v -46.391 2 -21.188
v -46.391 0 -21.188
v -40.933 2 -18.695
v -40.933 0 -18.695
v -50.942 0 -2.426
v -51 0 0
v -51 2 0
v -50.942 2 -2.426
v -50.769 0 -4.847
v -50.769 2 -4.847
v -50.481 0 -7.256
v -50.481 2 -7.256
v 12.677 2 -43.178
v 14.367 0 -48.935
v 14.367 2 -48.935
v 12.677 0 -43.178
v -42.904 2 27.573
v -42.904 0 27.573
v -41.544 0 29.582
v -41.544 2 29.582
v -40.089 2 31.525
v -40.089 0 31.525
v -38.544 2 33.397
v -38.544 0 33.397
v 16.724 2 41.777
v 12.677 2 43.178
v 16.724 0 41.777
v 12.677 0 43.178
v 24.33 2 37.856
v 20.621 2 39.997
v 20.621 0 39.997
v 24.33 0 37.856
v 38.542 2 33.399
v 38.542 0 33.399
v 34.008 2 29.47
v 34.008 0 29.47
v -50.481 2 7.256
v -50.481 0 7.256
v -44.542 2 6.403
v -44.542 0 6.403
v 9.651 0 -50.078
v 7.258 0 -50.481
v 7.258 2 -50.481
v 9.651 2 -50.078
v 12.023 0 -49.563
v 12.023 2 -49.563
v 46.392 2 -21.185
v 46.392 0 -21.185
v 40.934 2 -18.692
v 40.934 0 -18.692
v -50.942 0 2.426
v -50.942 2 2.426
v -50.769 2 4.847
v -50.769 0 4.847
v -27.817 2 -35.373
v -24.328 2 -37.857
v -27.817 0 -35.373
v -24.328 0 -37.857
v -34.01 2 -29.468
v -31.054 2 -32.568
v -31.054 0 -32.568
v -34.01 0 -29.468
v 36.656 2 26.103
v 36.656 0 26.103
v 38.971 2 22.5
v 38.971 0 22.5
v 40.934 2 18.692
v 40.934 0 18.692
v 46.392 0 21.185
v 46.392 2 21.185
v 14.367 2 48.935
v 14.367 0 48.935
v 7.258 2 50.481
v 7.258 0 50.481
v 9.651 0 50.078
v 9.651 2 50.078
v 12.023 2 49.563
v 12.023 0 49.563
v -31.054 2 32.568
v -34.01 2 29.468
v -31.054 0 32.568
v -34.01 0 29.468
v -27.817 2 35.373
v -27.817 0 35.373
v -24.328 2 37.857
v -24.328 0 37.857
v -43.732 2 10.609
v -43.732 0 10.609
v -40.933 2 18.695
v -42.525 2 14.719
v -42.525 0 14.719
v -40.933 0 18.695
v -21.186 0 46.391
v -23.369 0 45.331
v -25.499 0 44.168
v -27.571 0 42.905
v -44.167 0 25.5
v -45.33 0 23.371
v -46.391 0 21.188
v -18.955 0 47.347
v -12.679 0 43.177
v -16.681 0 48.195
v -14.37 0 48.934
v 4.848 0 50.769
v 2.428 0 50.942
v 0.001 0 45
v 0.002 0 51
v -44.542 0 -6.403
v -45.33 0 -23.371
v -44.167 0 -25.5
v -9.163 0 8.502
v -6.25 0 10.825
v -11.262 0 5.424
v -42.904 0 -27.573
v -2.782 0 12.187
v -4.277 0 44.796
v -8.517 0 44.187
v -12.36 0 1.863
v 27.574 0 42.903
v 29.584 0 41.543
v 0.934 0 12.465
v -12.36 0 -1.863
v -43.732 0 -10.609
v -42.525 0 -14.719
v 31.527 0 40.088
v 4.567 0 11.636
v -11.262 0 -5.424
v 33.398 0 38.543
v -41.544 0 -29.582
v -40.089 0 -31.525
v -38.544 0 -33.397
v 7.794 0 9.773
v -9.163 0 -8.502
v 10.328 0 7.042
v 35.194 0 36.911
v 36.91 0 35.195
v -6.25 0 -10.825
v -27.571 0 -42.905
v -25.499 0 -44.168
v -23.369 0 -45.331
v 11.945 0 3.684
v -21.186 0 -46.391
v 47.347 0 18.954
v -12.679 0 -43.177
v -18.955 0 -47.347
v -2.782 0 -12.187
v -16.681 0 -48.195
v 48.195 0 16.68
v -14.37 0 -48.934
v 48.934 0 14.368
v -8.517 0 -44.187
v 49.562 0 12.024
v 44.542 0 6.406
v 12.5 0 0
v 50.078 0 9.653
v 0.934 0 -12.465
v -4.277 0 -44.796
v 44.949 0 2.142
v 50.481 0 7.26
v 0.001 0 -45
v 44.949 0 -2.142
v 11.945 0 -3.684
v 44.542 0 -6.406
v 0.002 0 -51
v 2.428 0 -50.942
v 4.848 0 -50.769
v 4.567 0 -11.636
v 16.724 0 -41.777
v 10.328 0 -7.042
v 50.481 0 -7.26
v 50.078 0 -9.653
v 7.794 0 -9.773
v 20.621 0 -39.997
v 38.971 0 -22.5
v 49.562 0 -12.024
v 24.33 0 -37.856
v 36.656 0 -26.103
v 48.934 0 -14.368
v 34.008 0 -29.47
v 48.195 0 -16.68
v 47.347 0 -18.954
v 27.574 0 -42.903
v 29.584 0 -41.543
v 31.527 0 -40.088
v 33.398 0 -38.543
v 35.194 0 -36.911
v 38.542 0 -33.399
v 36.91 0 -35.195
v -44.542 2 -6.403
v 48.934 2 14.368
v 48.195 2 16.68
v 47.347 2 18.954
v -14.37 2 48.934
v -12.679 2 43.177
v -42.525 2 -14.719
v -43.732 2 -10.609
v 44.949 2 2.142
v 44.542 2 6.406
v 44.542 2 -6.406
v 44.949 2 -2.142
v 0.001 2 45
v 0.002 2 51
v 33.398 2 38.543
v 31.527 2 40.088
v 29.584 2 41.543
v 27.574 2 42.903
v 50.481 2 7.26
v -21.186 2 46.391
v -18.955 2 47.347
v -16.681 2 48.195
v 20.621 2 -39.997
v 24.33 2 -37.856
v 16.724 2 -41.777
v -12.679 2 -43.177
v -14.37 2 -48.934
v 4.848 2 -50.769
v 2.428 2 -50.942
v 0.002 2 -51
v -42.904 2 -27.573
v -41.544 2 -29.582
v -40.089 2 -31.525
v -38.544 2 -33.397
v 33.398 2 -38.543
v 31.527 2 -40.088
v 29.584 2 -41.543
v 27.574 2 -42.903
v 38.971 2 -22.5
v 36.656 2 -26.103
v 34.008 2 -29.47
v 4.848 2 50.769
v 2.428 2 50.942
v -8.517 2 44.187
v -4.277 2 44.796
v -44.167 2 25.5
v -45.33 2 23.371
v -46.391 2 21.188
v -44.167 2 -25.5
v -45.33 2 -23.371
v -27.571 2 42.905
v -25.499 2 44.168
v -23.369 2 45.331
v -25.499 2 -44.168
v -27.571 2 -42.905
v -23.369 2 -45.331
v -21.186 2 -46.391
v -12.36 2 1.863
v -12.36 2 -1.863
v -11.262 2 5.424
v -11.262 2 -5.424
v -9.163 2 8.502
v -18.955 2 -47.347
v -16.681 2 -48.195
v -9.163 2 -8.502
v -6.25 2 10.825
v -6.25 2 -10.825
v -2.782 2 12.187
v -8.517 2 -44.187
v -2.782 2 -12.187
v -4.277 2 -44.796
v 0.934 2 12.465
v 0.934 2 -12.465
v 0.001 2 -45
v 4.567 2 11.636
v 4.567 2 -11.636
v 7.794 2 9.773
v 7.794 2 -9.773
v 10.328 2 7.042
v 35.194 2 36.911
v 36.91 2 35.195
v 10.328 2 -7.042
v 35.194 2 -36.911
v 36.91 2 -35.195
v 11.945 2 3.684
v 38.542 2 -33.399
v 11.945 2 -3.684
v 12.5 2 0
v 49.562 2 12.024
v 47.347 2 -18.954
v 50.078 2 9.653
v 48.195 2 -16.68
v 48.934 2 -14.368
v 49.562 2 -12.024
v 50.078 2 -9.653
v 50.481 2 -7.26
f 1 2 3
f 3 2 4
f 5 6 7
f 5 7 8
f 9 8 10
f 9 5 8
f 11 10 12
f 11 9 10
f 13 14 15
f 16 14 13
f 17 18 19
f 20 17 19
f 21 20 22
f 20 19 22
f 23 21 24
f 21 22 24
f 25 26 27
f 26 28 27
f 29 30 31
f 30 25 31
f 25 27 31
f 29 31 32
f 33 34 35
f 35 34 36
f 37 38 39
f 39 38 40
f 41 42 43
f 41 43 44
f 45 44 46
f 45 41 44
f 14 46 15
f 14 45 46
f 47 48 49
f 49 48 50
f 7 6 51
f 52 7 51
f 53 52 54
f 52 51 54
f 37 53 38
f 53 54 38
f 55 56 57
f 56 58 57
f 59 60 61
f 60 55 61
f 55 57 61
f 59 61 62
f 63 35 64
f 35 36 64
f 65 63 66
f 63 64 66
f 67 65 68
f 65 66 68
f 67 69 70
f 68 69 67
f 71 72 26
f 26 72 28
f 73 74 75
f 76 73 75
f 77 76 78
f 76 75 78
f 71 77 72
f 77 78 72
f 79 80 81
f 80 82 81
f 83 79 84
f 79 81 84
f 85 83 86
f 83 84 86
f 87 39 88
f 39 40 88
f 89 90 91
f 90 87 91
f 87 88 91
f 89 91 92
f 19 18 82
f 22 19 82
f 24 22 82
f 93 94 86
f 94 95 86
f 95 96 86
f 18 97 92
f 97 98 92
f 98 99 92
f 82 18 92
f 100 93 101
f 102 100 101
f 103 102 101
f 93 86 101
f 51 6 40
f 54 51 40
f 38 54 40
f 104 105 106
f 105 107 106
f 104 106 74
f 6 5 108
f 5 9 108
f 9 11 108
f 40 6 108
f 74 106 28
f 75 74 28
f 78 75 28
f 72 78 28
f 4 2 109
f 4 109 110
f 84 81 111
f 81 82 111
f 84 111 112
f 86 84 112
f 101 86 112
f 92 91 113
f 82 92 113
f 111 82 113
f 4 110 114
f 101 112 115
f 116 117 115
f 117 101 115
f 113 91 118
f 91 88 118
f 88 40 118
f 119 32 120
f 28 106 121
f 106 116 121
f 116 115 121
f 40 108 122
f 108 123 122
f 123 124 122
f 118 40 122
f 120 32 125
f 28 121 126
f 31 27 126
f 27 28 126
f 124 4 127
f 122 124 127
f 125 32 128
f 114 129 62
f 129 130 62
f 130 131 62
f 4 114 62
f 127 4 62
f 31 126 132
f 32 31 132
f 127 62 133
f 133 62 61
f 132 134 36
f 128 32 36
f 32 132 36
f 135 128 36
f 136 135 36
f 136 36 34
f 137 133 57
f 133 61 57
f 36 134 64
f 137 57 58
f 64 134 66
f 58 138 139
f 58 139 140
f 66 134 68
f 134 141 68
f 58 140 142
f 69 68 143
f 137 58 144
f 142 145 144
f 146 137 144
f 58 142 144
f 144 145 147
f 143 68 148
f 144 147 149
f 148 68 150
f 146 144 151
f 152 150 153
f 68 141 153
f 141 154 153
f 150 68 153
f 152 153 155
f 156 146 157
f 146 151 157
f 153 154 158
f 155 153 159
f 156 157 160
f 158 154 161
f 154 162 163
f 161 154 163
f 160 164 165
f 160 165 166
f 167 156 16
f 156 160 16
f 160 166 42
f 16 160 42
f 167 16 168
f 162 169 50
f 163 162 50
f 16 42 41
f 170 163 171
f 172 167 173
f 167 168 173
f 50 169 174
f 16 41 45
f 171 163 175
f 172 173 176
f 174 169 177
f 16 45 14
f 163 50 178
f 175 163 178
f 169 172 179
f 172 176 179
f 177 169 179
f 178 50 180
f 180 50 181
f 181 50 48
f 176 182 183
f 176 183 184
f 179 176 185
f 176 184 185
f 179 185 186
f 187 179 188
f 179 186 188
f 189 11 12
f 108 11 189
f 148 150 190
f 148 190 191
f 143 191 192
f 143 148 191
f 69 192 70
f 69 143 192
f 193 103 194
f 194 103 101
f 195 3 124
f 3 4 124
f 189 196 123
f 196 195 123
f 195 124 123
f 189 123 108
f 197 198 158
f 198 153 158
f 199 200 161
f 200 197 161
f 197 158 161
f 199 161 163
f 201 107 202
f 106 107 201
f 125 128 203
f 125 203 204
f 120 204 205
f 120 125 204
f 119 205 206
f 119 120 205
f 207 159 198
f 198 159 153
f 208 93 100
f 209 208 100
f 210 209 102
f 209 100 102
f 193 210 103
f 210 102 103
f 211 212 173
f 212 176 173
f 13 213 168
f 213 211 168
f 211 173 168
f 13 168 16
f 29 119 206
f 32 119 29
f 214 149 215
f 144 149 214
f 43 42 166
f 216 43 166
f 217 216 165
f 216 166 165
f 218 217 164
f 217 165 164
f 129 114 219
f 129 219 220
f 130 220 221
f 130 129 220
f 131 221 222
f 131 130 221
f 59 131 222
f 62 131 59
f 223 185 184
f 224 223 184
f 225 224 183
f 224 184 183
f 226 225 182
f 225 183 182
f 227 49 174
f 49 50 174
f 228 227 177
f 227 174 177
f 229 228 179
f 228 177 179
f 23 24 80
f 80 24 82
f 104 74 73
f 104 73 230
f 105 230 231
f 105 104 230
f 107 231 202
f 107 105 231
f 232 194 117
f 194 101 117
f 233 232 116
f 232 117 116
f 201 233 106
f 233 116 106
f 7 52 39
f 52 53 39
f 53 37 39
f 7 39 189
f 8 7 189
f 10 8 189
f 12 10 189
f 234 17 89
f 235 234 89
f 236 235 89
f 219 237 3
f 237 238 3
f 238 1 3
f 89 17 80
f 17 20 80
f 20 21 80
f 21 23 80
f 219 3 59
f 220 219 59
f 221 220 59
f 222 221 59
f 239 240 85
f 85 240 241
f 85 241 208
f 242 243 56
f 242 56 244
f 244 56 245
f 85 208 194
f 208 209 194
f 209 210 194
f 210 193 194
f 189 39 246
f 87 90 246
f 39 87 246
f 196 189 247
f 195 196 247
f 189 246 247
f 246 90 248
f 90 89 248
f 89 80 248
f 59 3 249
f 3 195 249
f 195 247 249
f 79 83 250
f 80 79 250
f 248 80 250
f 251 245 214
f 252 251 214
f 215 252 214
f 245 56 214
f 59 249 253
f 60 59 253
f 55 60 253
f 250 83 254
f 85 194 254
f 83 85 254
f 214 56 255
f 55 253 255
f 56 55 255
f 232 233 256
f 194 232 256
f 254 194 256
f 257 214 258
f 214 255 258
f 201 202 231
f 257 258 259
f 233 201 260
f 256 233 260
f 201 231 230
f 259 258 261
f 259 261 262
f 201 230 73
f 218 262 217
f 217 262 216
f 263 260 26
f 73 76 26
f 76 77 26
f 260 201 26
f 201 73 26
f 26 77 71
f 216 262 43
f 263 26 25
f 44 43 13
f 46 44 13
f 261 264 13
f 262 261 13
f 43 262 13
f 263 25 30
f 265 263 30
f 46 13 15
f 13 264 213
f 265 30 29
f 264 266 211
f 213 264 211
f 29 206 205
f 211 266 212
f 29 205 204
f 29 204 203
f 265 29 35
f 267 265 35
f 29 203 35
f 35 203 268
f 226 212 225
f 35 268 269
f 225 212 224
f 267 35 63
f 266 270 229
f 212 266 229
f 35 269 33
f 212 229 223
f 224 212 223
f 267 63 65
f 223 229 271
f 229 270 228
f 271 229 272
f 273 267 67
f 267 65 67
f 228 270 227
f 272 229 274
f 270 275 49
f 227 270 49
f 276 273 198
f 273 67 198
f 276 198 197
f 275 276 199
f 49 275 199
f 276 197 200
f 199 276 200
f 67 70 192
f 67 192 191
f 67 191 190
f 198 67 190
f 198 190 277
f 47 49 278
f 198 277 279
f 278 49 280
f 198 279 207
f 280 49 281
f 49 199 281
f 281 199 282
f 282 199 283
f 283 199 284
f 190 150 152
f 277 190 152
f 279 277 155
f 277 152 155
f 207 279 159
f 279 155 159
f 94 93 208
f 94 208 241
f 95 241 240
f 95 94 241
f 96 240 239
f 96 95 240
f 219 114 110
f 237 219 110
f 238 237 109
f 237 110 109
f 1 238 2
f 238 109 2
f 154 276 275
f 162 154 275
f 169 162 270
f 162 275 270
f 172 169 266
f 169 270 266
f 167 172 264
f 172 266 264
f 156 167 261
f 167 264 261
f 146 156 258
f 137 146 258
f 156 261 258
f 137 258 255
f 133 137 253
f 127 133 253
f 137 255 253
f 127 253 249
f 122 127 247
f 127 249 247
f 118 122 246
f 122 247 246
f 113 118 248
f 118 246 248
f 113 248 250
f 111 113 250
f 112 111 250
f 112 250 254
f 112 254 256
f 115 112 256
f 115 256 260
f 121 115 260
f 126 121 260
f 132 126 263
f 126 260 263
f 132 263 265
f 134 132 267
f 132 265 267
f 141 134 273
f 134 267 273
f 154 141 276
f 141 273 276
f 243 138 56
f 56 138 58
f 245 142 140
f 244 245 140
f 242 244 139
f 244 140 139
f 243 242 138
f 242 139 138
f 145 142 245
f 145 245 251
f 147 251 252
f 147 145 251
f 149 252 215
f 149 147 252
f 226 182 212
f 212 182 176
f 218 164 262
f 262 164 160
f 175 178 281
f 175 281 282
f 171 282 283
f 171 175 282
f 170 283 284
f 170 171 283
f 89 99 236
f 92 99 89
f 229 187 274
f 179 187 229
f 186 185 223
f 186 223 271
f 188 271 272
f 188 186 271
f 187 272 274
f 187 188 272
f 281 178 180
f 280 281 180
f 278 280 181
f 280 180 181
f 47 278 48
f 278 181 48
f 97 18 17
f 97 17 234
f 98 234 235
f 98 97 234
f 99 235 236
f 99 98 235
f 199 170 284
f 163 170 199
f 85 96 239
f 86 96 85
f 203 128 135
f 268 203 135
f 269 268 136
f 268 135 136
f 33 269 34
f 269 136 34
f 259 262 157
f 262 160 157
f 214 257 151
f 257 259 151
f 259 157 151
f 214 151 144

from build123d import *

# Parameters (mm, degrees)
SKETCH1_R                 = 45
BOSS_EXTRUDE1_DEPTH       = 2
BOSS_EXTRUDE2_DEPTH       = 2
CIRPATTERN1_COUNT         = 11
CIRPATTERN1_COPY_1_DEPTH  = 2
CIRPATTERN1_COPY_2_DEPTH  = 2
CIRPATTERN1_COPY_3_DEPTH  = 2
CIRPATTERN1_COPY_4_DEPTH  = 2
CIRPATTERN1_COPY_5_DEPTH  = 2
CIRPATTERN1_COPY_6_DEPTH  = 2
CIRPATTERN1_COPY_7_DEPTH  = 2
CIRPATTERN1_COPY_8_DEPTH  = 2
CIRPATTERN1_COPY_9_DEPTH  = 2
CIRPATTERN1_COPY_10_DEPTH = 2
SKETCH3_R                 = 12.5
CUT_EXTRUDE1_DEPTH        = 2


with BuildPart() as part:
    # Sketch1 → Boss-Extrude1 (new body)
    with BuildSketch(Plane(origin=(0, 0, 0), x_dir=(1, 0, 0), z_dir=(0, 1, 0))):
        Circle(SKETCH1_R)
    extrude(amount=BOSS_EXTRUDE1_DEPTH)

    # Sketch2 → Boss-Extrude2 (add)
    with BuildSketch(Plane(origin=(0, 0, 0), x_dir=(1, 0, 0), z_dir=(0, 1, 0))):
        with BuildLine():
            Line((0, 0), (-51, 0))
            ThreePointArc((-51, 0), (-50.870115566, -3.637491206), (-50.481123832, -7.256454825))
            Line((-50.481123832, -7.256454825), (0, 0))
        make_face()
    boss_extrude2 = extrude(amount=BOSS_EXTRUDE2_DEPTH)

    # Mirror1: Boss-Extrude2 across plane
    add(boss_extrude2.mirror(Plane.XY))

    # CirPattern1: Boss-Extrude2 ×11 about axis
    cirpattern1_axis = Axis((0, 0, 0), (0, 1, 0))
    for i in range(1, CIRPATTERN1_COUNT):
        add(boss_extrude2.rotate(cirpattern1_axis, i * 360 / CIRPATTERN1_COUNT))

    # CirPattern1 copy 1 sketch → CirPattern1 copy 1 (add)
    with BuildSketch(Plane(origin=(0, 0, 0), x_dir=(0.841253533, 0, -0.540640817), z_dir=(0, 1, 0))):
        with BuildLine():
            Line((0, 0), (-51, 0))
            ThreePointArc((-51, 0), (-50.870115566, 3.637491206), (-50.481123832, 7.256454825))
            Line((-50.481123832, 7.256454825), (0, 0))
        make_face()
    extrude(amount=CIRPATTERN1_COPY_1_DEPTH)

    # CirPattern1 copy 2 sketch → CirPattern1 copy 2 (add)
    with BuildSketch(Plane(origin=(0, 0, 0), x_dir=(0.415415013, 0, -0.909631995), z_dir=(0, 1, 0))):
        with BuildLine():
            Line((0, 0), (-51, 0))
            ThreePointArc((-51, 0), (-50.870115566, 3.637491206), (-50.481123832, 7.256454825))
            Line((-50.481123832, 7.256454825), (0, 0))
        make_face()
    extrude(amount=CIRPATTERN1_COPY_2_DEPTH)

    # CirPattern1 copy 3 sketch → CirPattern1 copy 3 (add)
    with BuildSketch(Plane(origin=(0, 0, 0), x_dir=(-0.142314838, 0, -0.989821442), z_dir=(0, 1, 0))):
        with BuildLine():
            Line((0, 0), (-51, 0))
            ThreePointArc((-51, 0), (-50.870115566, 3.637491206), (-50.481123832, 7.256454825))
            Line((-50.481123832, 7.256454825), (0, 0))
        make_face()
    extrude(amount=CIRPATTERN1_COPY_3_DEPTH)

    # CirPattern1 copy 4 sketch → CirPattern1 copy 4 (add)
    with BuildSketch(Plane(origin=(0, 0, 0), x_dir=(-0.654860734, 0, -0.755749574), z_dir=(0, 1, 0))):
        with BuildLine():
            Line((0, 0), (-51, 0))
            ThreePointArc((-51, 0), (-50.870115566, 3.637491206), (-50.481123832, 7.256454825))
            Line((-50.481123832, 7.256454825), (0, 0))
        make_face()
    extrude(amount=CIRPATTERN1_COPY_4_DEPTH)

    # CirPattern1 copy 5 sketch → CirPattern1 copy 5 (add)
    with BuildSketch(Plane(origin=(0, 0, 0), x_dir=(-0.959492974, 0, -0.281732557), z_dir=(0, 1, 0))):
        with BuildLine():
            Line((0, 0), (-51, 0))
            ThreePointArc((-51, 0), (-50.870115566, 3.637491206), (-50.481123832, 7.256454825))
            Line((-50.481123832, 7.256454825), (0, 0))
        make_face()
    extrude(amount=CIRPATTERN1_COPY_5_DEPTH)

    # CirPattern1 copy 6 sketch → CirPattern1 copy 6 (add)
    with BuildSketch(Plane(origin=(0, 0, 0), x_dir=(-0.959492974, 0, 0.281732557), z_dir=(0, 1, 0))):
        with BuildLine():
            Line((0, 0), (-51, 0))
            ThreePointArc((-51, 0), (-50.870115566, 3.637491206), (-50.481123832, 7.256454825))
            Line((-50.481123832, 7.256454825), (0, 0))
        make_face()
    extrude(amount=CIRPATTERN1_COPY_6_DEPTH)

    # CirPattern1 copy 7 sketch → CirPattern1 copy 7 (add)
    with BuildSketch(Plane(origin=(0, 0, 0), x_dir=(-0.654860734, 0, 0.755749574), z_dir=(0, 1, 0))):
        with BuildLine():
            Line((0, 0), (-51, 0))
            ThreePointArc((-51, 0), (-50.870115566, 3.637491206), (-50.481123832, 7.256454825))
            Line((-50.481123832, 7.256454825), (0, 0))
        make_face()
    extrude(amount=CIRPATTERN1_COPY_7_DEPTH)

    # CirPattern1 copy 8 sketch → CirPattern1 copy 8 (add)
    with BuildSketch(Plane(origin=(0, 0, 0), x_dir=(-0.142314838, 0, 0.989821442), z_dir=(0, 1, 0))):
        with BuildLine():
            Line((0, 0), (-51, 0))
            ThreePointArc((-51, 0), (-50.870115566, 3.637491206), (-50.481123832, 7.256454825))
            Line((-50.481123832, 7.256454825), (0, 0))
        make_face()
    extrude(amount=CIRPATTERN1_COPY_8_DEPTH)

    # CirPattern1 copy 9 sketch → CirPattern1 copy 9 (add)
    with BuildSketch(Plane(origin=(0, 0, 0), x_dir=(0.415415013, 0, 0.909631995), z_dir=(0, 1, 0))):
        with BuildLine():
            Line((0, 0), (-51, 0))
            ThreePointArc((-51, 0), (-50.870115566, 3.637491206), (-50.481123832, 7.256454825))
            Line((-50.481123832, 7.256454825), (0, 0))
        make_face()
    extrude(amount=CIRPATTERN1_COPY_9_DEPTH)

    # CirPattern1 copy 10 sketch → CirPattern1 copy 10 (add)
    with BuildSketch(Plane(origin=(0, 0, 0), x_dir=(0.841253533, 0, 0.540640817), z_dir=(0, 1, 0))):
        with BuildLine():
            Line((0, 0), (-51, 0))
            ThreePointArc((-51, 0), (-50.870115566, 3.637491206), (-50.481123832, 7.256454825))
            Line((-50.481123832, 7.256454825), (0, 0))
        make_face()
    extrude(amount=CIRPATTERN1_COPY_10_DEPTH)

    # Sketch3 → Cut-Extrude1 (cut)
    with BuildSketch(Plane(origin=(0, 2, 0), x_dir=(1, 0, 0), z_dir=(0, 1, 0))):
        Circle(SKETCH3_R)
    extrude(amount=-CUT_EXTRUDE1_DEPTH, mode=Mode.SUBTRACT)


solid = part.part
